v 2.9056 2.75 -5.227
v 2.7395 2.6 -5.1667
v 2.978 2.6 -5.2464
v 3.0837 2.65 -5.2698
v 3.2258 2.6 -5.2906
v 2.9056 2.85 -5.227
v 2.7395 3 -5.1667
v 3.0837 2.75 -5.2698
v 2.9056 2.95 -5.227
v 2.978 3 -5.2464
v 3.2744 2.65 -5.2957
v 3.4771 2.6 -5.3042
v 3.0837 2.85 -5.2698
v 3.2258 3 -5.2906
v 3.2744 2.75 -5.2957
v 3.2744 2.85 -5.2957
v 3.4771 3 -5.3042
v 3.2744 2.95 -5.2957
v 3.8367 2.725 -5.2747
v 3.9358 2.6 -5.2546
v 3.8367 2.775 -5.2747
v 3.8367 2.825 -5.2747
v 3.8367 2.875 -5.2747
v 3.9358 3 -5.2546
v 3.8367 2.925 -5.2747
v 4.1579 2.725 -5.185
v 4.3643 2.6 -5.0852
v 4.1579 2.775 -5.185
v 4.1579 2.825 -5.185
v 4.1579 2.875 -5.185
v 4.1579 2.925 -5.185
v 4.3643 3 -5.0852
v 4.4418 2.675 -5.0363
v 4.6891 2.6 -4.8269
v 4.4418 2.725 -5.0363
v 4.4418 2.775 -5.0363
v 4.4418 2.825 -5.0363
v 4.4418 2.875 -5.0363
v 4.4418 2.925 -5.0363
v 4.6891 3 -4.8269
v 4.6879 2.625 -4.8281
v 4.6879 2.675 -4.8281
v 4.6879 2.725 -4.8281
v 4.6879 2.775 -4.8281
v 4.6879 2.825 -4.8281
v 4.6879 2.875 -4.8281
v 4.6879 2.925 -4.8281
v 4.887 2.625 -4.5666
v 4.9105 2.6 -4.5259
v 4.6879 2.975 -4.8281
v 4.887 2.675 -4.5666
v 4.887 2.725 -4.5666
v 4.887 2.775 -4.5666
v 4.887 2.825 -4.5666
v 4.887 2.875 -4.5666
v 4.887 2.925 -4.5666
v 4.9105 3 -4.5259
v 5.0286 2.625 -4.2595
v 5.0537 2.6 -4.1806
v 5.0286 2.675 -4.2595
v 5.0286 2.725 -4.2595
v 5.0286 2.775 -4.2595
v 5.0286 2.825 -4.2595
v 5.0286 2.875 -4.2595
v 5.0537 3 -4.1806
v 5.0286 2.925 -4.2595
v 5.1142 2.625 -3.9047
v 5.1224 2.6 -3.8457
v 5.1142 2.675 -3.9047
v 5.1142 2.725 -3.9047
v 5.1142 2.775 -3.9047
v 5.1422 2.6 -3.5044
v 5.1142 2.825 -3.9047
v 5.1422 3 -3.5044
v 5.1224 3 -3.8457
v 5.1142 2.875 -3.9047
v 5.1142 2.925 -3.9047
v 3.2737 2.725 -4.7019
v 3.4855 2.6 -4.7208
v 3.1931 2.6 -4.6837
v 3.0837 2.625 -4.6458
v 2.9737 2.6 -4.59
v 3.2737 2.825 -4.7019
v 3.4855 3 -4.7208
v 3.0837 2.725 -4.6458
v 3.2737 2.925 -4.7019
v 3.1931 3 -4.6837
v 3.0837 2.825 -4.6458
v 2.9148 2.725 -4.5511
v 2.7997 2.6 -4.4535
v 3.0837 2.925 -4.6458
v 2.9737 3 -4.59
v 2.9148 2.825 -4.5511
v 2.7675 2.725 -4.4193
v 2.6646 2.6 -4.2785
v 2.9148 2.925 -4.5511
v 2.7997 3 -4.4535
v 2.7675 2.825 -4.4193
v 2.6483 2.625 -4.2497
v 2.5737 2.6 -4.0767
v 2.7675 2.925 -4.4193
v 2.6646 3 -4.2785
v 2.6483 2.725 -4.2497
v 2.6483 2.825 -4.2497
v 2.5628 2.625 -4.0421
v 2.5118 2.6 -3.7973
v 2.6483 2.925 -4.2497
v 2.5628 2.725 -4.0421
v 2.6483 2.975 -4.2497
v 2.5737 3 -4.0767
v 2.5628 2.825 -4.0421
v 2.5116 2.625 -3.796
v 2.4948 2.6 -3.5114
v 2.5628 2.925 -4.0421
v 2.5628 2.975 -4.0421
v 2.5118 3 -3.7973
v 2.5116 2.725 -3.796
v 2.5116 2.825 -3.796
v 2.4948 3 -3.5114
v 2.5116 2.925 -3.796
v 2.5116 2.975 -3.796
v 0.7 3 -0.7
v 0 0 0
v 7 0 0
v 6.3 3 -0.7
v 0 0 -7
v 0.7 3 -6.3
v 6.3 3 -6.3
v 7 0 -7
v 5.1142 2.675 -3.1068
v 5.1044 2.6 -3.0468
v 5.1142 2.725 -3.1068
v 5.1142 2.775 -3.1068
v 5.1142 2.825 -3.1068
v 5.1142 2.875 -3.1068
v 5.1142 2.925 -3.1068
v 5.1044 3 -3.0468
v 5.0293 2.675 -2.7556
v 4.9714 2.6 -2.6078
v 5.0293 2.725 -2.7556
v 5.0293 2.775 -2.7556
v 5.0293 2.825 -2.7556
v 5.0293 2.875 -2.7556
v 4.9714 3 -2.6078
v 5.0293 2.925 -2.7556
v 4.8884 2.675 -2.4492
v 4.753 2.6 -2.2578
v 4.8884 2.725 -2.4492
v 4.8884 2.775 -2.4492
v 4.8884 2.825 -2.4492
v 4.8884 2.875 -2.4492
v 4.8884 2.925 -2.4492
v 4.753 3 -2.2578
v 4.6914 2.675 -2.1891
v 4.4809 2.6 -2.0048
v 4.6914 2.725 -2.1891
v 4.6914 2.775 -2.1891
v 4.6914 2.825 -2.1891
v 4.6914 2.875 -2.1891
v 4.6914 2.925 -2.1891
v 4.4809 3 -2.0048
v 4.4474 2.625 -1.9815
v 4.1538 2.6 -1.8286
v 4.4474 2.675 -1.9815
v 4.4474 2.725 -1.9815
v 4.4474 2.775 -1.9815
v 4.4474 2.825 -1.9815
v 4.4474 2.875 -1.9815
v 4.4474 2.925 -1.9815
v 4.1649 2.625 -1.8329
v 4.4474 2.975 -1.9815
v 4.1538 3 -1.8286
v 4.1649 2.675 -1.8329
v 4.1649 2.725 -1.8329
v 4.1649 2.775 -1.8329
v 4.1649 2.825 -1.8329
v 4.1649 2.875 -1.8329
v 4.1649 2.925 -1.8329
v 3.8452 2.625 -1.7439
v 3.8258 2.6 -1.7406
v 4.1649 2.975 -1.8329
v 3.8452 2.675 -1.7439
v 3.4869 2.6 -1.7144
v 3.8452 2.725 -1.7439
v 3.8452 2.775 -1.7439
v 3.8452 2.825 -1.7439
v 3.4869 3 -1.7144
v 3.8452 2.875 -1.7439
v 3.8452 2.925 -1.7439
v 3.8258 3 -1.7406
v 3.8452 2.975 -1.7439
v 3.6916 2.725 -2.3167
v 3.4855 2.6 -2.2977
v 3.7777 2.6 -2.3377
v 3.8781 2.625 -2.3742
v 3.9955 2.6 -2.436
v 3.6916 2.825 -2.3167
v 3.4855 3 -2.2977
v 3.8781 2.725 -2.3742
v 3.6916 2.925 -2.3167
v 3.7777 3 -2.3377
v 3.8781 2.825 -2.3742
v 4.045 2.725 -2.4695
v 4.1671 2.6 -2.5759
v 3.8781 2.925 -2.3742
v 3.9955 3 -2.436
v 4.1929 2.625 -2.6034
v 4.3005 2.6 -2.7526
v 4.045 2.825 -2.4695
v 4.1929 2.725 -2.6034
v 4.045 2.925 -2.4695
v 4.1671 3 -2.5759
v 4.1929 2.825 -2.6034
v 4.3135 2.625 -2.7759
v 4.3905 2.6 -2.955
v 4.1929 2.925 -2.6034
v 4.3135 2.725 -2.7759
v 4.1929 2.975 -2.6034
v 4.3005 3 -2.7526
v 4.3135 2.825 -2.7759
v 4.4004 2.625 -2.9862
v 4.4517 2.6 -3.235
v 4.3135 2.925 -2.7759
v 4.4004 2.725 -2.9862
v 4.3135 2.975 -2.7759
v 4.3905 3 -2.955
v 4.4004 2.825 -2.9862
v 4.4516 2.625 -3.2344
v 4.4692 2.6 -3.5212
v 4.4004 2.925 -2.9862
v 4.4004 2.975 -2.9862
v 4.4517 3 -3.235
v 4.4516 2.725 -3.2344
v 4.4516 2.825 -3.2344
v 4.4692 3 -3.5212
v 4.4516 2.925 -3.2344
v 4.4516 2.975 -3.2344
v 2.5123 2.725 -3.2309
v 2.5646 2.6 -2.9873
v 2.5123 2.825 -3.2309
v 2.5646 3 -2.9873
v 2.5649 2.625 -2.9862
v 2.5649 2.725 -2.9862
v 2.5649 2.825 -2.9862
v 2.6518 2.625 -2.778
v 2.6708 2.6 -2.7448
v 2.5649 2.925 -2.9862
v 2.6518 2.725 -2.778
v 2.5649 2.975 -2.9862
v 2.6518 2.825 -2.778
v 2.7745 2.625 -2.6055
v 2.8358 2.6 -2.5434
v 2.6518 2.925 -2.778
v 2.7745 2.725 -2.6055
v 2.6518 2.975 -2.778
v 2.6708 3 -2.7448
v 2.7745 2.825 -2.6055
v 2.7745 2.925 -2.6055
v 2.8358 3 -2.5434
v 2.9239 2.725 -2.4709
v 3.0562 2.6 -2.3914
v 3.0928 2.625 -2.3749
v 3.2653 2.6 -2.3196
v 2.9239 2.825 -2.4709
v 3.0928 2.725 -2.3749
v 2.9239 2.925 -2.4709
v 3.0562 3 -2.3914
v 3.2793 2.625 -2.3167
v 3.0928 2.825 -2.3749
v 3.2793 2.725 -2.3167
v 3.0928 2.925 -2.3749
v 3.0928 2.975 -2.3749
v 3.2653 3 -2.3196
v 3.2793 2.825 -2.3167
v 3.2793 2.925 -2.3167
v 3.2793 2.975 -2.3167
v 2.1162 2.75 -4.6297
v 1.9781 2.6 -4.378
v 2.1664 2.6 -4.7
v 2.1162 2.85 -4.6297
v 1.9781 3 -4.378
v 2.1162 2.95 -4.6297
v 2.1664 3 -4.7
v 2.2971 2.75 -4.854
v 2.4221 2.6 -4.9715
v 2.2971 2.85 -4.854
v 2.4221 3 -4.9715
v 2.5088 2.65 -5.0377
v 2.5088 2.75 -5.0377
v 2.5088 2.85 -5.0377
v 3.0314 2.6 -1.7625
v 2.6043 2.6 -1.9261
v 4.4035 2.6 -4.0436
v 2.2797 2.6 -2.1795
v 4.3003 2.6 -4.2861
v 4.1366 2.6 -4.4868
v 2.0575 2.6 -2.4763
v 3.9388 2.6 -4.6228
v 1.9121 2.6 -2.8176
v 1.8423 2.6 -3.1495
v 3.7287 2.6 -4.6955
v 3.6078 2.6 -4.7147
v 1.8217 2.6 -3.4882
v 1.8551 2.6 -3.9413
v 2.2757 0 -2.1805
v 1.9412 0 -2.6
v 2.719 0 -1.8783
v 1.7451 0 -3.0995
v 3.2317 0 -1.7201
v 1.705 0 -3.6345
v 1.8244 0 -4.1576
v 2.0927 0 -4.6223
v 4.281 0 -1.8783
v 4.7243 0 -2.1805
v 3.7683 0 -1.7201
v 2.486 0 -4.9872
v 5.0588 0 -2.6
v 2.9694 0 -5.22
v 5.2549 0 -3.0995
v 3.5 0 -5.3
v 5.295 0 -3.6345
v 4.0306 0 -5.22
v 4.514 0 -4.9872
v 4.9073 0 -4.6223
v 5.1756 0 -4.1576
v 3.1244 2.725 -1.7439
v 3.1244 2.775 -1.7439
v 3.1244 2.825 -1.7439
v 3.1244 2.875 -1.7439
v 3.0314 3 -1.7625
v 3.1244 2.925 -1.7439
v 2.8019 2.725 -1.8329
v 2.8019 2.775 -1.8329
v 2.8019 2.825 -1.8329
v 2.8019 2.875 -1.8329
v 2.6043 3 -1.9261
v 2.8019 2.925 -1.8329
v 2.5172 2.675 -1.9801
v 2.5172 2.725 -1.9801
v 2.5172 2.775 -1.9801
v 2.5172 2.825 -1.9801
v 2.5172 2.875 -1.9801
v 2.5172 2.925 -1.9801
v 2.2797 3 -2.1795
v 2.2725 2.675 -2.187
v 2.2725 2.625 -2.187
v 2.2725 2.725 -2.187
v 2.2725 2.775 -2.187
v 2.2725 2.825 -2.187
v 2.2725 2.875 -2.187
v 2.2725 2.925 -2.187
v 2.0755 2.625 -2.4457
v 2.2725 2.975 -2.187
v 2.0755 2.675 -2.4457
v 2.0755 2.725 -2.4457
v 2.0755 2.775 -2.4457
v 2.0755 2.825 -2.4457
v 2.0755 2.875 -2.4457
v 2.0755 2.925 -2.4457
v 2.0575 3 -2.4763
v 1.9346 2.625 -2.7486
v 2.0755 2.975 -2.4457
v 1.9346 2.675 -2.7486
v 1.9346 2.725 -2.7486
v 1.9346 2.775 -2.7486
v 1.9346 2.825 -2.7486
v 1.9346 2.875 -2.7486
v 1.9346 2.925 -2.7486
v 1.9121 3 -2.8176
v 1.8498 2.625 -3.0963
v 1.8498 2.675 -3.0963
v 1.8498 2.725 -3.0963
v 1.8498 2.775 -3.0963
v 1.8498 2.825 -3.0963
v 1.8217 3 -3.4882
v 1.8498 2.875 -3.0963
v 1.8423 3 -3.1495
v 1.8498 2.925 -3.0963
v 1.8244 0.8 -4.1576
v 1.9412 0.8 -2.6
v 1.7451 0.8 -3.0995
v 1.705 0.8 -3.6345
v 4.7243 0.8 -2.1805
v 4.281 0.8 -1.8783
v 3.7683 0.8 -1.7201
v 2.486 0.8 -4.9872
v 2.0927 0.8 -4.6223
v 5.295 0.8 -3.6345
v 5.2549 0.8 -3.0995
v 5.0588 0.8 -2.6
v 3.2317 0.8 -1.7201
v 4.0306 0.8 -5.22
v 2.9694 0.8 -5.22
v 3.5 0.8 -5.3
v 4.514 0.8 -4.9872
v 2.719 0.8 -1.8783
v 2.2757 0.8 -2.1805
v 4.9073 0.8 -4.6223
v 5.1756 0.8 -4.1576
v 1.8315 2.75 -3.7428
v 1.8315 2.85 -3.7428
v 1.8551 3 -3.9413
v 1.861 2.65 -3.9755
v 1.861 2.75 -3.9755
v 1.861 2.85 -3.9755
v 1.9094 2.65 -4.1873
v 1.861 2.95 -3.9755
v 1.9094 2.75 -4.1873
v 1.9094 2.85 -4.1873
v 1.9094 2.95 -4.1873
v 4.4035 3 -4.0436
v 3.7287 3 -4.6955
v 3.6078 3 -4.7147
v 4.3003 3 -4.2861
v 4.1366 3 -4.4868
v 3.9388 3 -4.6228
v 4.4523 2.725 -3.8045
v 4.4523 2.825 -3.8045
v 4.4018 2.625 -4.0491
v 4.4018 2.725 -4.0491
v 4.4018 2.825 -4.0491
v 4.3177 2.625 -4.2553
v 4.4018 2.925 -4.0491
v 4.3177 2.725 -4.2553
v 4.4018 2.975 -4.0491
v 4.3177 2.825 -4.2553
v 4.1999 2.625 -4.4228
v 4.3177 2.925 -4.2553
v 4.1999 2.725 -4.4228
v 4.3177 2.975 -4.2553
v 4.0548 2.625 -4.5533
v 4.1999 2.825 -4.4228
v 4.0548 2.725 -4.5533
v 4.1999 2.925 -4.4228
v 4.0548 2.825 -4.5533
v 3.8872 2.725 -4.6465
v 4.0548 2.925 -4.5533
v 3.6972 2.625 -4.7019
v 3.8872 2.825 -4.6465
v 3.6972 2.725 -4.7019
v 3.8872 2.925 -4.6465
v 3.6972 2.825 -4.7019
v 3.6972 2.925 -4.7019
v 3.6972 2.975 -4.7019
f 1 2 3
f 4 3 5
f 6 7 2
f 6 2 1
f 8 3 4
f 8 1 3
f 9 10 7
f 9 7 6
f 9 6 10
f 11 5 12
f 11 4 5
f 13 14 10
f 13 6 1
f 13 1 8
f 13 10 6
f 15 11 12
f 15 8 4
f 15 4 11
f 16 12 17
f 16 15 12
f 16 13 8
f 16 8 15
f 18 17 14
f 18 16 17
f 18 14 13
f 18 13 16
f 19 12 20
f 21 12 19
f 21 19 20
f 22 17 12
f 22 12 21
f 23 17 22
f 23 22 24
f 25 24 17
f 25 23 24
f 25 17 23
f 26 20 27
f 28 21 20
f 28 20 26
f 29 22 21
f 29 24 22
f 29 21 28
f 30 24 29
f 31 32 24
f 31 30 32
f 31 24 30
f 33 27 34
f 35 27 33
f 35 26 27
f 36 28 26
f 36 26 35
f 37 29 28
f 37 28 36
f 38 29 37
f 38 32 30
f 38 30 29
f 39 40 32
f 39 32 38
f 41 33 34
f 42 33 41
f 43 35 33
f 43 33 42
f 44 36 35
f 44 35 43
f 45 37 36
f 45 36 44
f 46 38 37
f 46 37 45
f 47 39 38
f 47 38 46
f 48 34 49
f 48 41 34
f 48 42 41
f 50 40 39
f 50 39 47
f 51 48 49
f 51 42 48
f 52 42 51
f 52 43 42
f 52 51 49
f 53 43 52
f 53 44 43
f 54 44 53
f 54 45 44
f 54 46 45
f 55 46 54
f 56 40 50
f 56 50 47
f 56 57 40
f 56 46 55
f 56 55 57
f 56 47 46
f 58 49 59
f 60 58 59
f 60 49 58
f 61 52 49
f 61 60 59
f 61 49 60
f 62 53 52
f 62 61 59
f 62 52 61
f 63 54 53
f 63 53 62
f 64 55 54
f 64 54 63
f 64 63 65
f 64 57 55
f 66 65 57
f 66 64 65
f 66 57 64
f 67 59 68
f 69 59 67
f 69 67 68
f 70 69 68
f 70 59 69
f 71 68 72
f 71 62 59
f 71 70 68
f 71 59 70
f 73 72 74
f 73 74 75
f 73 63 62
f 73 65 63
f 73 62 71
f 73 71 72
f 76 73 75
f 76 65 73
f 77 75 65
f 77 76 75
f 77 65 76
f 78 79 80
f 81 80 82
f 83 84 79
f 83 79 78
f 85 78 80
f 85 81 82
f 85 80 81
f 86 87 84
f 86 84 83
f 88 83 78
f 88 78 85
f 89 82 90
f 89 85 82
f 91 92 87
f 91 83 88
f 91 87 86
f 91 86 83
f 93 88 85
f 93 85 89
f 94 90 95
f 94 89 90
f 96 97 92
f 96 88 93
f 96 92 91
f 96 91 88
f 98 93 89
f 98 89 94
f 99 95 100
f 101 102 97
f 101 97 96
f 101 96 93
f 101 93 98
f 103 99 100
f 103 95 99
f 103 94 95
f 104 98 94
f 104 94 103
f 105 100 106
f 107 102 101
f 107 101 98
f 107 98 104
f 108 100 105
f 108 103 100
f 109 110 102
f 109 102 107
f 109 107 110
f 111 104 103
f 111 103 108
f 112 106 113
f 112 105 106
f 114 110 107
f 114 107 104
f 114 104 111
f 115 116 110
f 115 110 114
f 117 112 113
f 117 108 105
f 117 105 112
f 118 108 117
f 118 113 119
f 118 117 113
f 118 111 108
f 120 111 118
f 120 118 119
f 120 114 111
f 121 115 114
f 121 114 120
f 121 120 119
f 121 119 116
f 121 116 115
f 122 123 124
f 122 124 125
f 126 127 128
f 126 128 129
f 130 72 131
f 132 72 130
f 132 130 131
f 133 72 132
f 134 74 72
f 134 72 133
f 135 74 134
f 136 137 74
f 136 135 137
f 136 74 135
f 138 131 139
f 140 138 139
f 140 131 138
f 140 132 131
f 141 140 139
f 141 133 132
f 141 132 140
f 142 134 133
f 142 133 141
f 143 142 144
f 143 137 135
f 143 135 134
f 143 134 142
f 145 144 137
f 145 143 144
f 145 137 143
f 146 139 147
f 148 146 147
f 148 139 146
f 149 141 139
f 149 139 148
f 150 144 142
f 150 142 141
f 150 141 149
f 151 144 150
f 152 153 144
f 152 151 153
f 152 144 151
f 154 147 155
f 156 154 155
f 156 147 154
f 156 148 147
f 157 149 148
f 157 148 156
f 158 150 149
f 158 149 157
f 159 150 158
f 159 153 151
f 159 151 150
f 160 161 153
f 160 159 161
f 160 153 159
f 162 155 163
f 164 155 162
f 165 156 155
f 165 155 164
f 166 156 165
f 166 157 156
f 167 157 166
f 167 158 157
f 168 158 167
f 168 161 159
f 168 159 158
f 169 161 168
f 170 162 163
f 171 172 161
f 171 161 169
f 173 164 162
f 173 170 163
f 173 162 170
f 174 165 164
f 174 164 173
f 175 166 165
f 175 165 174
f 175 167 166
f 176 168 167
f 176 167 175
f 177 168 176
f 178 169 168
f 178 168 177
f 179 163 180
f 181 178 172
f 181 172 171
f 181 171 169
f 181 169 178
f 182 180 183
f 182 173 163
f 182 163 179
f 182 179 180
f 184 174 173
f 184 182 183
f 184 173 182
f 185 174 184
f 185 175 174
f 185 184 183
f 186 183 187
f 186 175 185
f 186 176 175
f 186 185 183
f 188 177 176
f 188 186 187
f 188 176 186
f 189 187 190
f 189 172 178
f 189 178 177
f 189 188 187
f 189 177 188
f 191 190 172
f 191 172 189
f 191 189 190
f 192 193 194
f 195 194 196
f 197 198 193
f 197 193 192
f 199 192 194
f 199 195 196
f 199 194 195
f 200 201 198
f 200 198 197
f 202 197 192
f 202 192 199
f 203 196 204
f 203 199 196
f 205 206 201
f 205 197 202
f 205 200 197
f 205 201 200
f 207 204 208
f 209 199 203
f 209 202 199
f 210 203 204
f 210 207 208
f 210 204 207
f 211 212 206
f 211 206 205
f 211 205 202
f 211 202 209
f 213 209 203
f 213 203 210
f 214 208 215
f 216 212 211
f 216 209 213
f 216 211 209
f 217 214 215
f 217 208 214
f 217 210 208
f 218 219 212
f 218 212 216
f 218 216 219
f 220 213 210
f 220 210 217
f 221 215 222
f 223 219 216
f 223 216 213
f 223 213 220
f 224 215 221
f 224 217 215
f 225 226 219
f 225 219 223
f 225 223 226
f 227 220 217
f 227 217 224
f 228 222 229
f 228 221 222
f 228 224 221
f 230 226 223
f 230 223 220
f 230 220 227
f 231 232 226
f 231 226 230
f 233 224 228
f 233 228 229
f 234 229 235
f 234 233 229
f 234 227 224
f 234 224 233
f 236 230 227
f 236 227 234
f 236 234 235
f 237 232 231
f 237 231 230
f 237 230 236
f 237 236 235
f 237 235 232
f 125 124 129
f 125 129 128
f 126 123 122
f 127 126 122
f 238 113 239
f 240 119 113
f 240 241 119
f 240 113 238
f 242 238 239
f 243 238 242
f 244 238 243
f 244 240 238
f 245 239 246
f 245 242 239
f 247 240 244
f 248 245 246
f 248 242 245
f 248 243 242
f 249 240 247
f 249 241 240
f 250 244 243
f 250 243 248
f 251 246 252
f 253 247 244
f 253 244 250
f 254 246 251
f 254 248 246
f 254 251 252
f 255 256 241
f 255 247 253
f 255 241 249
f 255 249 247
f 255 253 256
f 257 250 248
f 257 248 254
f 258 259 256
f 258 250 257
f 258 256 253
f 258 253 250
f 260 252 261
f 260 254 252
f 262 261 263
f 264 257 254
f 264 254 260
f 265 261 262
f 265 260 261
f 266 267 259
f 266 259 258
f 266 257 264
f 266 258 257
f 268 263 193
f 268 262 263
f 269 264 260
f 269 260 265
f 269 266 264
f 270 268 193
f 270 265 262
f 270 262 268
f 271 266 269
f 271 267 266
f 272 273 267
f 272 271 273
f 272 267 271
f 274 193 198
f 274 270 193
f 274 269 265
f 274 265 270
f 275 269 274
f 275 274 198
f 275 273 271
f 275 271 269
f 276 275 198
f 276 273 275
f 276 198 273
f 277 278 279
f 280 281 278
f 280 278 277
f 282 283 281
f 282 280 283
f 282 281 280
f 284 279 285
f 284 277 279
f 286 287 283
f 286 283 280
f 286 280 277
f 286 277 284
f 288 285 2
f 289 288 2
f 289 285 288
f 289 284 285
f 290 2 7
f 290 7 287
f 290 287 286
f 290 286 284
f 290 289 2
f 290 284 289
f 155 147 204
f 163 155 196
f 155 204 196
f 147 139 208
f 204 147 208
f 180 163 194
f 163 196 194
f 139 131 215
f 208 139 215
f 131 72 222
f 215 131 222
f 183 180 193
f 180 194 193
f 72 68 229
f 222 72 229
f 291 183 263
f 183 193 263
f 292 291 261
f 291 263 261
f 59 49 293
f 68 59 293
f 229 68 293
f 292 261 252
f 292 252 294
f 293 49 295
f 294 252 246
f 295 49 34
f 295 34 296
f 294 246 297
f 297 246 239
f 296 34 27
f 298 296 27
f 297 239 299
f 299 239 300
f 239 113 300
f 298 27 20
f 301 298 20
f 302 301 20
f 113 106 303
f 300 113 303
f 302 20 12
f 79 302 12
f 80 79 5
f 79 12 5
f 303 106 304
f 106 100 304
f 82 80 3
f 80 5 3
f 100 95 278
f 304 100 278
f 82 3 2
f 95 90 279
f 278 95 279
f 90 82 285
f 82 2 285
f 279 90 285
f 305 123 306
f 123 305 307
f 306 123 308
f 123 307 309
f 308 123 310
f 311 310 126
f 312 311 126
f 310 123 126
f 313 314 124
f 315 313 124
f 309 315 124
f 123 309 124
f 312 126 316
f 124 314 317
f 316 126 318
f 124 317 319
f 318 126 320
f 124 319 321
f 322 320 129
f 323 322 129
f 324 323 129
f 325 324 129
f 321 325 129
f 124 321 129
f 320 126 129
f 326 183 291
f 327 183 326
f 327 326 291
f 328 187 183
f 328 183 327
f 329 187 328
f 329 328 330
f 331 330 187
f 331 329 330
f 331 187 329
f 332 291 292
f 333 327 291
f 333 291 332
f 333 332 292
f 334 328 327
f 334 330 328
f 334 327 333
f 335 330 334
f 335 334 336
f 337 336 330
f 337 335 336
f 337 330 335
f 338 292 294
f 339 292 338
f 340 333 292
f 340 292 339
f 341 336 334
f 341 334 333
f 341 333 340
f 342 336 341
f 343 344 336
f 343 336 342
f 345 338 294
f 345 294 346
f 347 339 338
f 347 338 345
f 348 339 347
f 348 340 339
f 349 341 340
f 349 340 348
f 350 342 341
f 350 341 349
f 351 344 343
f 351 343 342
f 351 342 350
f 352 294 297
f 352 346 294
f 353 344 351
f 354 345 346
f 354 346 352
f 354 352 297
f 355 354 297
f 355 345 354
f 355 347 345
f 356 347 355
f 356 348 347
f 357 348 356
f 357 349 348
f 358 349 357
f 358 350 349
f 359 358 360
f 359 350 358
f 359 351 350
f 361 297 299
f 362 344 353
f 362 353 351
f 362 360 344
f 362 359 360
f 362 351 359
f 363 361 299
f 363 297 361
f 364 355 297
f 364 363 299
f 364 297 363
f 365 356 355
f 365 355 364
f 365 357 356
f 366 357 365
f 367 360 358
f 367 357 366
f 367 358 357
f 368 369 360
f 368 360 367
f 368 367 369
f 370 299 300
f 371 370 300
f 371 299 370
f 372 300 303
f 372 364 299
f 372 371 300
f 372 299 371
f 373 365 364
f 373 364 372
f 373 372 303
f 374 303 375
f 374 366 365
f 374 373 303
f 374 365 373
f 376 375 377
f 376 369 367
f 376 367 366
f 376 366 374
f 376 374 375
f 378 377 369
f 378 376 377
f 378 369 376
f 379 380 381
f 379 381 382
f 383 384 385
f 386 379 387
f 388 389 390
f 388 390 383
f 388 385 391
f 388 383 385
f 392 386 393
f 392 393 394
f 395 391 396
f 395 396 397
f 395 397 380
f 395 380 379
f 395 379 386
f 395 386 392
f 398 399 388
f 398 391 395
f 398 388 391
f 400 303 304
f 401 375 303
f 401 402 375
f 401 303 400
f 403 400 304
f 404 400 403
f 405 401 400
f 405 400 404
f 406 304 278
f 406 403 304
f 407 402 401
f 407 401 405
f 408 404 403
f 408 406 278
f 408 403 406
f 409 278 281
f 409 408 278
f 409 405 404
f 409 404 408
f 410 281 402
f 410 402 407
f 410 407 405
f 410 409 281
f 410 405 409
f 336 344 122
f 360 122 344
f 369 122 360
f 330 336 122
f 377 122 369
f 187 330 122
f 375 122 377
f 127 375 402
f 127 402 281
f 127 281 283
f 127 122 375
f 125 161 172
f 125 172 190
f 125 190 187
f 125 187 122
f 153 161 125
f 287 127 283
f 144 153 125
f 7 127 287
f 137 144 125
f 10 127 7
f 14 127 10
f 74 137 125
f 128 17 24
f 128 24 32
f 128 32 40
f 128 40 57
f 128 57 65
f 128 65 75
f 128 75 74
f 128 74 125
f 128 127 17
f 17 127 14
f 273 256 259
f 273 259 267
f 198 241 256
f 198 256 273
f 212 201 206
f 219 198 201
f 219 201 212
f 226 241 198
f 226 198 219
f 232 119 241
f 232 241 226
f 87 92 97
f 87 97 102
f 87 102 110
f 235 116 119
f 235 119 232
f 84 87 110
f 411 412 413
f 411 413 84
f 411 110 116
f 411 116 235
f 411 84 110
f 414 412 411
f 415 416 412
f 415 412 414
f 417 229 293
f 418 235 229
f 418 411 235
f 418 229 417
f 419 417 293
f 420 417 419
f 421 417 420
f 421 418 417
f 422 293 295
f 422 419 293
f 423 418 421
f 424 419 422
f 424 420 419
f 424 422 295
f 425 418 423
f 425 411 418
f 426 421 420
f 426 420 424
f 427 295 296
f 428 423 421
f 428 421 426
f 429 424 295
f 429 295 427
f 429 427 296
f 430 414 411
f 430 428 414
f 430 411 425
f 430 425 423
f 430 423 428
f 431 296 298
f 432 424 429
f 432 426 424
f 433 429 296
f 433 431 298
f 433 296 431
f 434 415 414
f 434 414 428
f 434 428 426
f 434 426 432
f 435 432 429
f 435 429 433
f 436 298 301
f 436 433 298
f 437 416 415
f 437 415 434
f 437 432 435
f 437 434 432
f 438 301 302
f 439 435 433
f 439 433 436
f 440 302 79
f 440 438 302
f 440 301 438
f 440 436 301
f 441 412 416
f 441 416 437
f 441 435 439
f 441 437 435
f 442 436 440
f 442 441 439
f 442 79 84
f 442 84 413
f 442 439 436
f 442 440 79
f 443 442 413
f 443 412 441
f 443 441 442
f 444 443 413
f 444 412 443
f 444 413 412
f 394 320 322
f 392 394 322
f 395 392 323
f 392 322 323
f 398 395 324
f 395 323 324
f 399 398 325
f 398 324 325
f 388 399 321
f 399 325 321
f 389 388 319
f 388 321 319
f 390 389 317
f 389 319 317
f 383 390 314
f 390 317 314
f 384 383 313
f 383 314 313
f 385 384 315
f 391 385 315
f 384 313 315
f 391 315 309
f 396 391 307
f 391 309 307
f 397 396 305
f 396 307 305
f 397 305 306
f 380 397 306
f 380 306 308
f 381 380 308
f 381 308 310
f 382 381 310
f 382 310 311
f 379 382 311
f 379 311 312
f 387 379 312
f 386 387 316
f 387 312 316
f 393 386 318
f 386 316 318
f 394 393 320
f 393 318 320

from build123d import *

# Parameters (mm, degrees)
SKETCH1_W           = 7
SKETCH1_H           = 7
BOSS_EXTRUDE1_DEPTH = 3
CUT_EXTRUDE1_DEPTH  = 7
CUT_EXTRUDE2_DEPTH  = 11
SKETCH4_R           = 1.8
CUT_EXTRUDE3_DEPTH  = 0.8
CUT_EXTRUDE4_DEPTH  = 0.4


with BuildPart() as part:
    # Sketch1 → Boss-Extrude1 (new body)
    with BuildSketch(Plane(origin=(0, 0, 0), x_dir=(1, 0, 0), z_dir=(0, 1, 0))):
        with Locations((3.5, 3.5)):
            Rectangle(SKETCH1_W, SKETCH1_H)
    extrude(amount=BOSS_EXTRUDE1_DEPTH)

    # Sketch2 → Cut-Extrude1 (cut)
    with BuildSketch(Plane.XY):
        Polygon((0, 0), (0.7, 3), (0, 3), align=None)
        Polygon((7, 0), (6.3, 3), (7, 3), align=None)
    extrude(amount=-CUT_EXTRUDE1_DEPTH, mode=Mode.SUBTRACT)

    # Sketch3 → Cut-Extrude2 (cut)
    with BuildSketch(Plane(origin=(0, 0, 0), x_dir=(0, 0, -1), z_dir=(1, 0, 0))):
        Polygon((0, 0), (0.7, 3), (0, 3), align=None)
        Polygon((7, 3), (6.3, 3), (7, 0), align=None)
    extrude(amount=CUT_EXTRUDE2_DEPTH, mode=Mode.SUBTRACT)

    # Sketch4 → Cut-Extrude3 (cut)
    with BuildSketch(Plane.XZ):
        with Locations(Location((3.5, -3.5, 0), (0, 0, 270))):
            Circle(SKETCH4_R)
    extrude(amount=-CUT_EXTRUDE3_DEPTH, mode=Mode.SUBTRACT)

    # Sketch5 → Cut-Extrude4 (cut)
    with BuildSketch(Plane(origin=(0, 3, 0), x_dir=(1, 0, 0), z_dir=(0, 1, 0))):
        with BuildLine():
            add(Edge.make_bspline(
                [(1.821714103, 3.488248698), (1.821961784, 3.531500253), (1.822448196, 3.616440725), (1.830876604, 3.741051587), (1.841985901, 3.86049575), (1.860077374, 3.974303397), (1.881359551, 4.083007187), (1.907977906, 4.186574853), (1.940043598, 4.284643186), (1.96555211, 4.347258757), (1.978064263, 4.377972255)],
                knots=[0, 0, 0, 0, 1.141009212, 2.240794809, 3.294380675, 4.305229195, 5.280013876, 6.216333343, 7.125095522, 8, 8, 8, 8], degree=3))
            add(Edge.make_bspline(
                [(1.978064263, 4.377972255), (1.998516886, 4.421635051), (2.039181575, 4.508447097), (2.114702293, 4.631119496), (2.200300575, 4.746809508), (2.295271713, 4.854910638), (2.397191064, 4.953795484), (2.506539435, 5.038426674), (2.619432008, 5.111662383), (2.699724257, 5.148495592), (2.739482532, 5.166734275)],
                knots=[0, 0, 0, 0, 1.031372299, 2.050613973, 3.077158538, 4.108712802, 5.127684358, 6.111366908, 7.06480644, 8, 8, 8, 8], degree=3))
            add(Edge.make_bspline(
                [(2.739482532, 5.166734275), (2.766470301, 5.177804055), (2.821019461, 5.200178904), (2.905795278, 5.228103887), (2.993787729, 5.250791674), (3.084360371, 5.271071912), (3.178392588, 5.285055803), (3.27512456, 5.296780816), (3.375085669, 5.302926099), (3.442700631, 5.303740345), (3.47706266, 5.304154146)],
                knots=[0, 0, 0, 0, 0.92659354, 1.872881803, 2.832850937, 3.813025581, 4.820167273, 5.851730198, 6.908245912, 8, 8, 8, 8], degree=3))
            add(Edge.make_bspline(
                [(3.47706266, 5.304154146), (3.538590536, 5.302611845), (3.659001433, 5.299593539), (3.834887941, 5.277792675), (4.001329981, 5.240979909), (4.157764144, 5.187771817), (4.305539157, 5.121260548), (4.443506895, 5.038760892), (4.571871554, 4.941165749), (4.690385205, 4.829813461), (4.797115236, 4.704898086), (4.890068226, 4.567586522), (4.968043218, 4.418522223), (5.032260126, 4.258116463), (5.081605981, 4.085845307), (5.117258315, 3.902194835), (5.138438688, 3.707029775), (5.140941529, 3.573137898), (5.142226923, 3.504374499)],
                knots=[0, 0, 0, 0, 1.064641025, 2.083517118, 3.061799897, 4.009540929, 4.938075217, 5.861300345, 6.78508344, 7.723570974, 8.670267188, 9.622657076, 10.586935816, 11.576069104, 12.607749008, 13.683335114, 14.81022093, 16, 16, 16, 16], degree=3))
            add(Edge.make_bspline(
                [(5.142226923, 3.504374499), (5.140971218, 3.436071549), (5.138526593, 3.303098467), (5.116950876, 3.109464875), (5.082776635, 2.92715322), (5.032236807, 2.75657997), (4.969936504, 2.596443536), (4.89115913, 2.448651271), (4.800152856, 2.311242808), (4.693574415, 2.187673494), (4.577055417, 2.075682155), (4.448853581, 1.979227653), (4.31189018, 1.896616215), (4.164920865, 1.829912739), (4.008903554, 1.777800449), (3.843329096, 1.740704804), (3.668112571, 1.718987832), (3.548170832, 1.715958568), (3.486878366, 1.714410557)],
                knots=[0, 0, 0, 0, 1.18845052, 2.313691126, 3.386664782, 4.412527756, 5.405809582, 6.372003093, 7.321919452, 8.268293321, 9.206237639, 10.129603466, 11.054616372, 11.9847576, 12.932764752, 13.912672021, 14.933336461, 16, 16, 16, 16], degree=3))
            add(Edge.make_bspline(
                [(3.486878366, 1.714410557), (3.424885779, 1.71596214), (3.303548476, 1.718999034), (3.126463104, 1.7406499), (2.959245037, 1.777757756), (2.802013351, 1.830053351), (2.653695695, 1.895743521), (2.51566143, 1.97751079), (2.387834254, 2.074576155), (2.270341671, 2.185249258), (2.163829132, 2.308455276), (2.072952075, 2.444980241), (1.994170592, 2.591328945), (1.931542745, 2.74971822), (1.881281222, 2.918518444), (1.847023473, 3.098700906), (1.825406036, 3.289769697), (1.822967241, 3.420879762), (1.821714103, 3.488248698)],
                knots=[0, 0, 0, 0, 1.080878253, 2.11558926, 3.1052859, 4.062802436, 5.000434901, 5.928596448, 6.853693179, 7.793554778, 8.738606028, 9.68692032, 10.647726704, 11.63151566, 12.651483354, 13.714466703, 14.825613081, 16, 16, 16, 16], degree=3))
        make_face()
        with BuildLine():
            add(Edge.make_bspline(
                [(2.494791026, 3.511385717), (2.495463421, 3.46297147), (2.496765502, 3.369218203), (2.510634389, 3.233137604), (2.531681539, 3.105921329), (2.562634465, 2.987713764), (2.601737596, 2.878429396), (2.649647038, 2.77797681), (2.7061648, 2.686206391), (2.772752717, 2.605055542), (2.844795621, 2.532603477), (2.92255951, 2.469914167), (3.004595136, 2.415957097), (3.092321967, 2.373358172), (3.183914249, 2.339551264), (3.280083591, 2.31448468), (3.381308169, 2.300720664), (3.450381011, 2.298746792), (3.485476122, 2.29774389)],
                knots=[0, 0, 0, 0, 1.313550922, 2.543666373, 3.708465049, 4.810029406, 5.85539231, 6.85404609, 7.825601258, 8.772642133, 9.696587791, 10.59409323, 11.479048685, 12.35559886, 13.234601248, 14.125357077, 15.047515647, 16, 16, 16, 16], degree=3))
            add(Edge.make_bspline(
                [(3.485476122, 2.29774389), (3.520575961, 2.298726471), (3.589658109, 2.30066035), (3.690758312, 2.31470579), (3.787118236, 2.338697967), (3.878346649, 2.372331634), (3.964859358, 2.415606978), (4.046581009, 2.468354444), (4.123040539, 2.531328963), (4.195005026, 2.602728481), (4.259795575, 2.684418325), (4.315832134, 2.776172907), (4.363717971, 2.877234741), (4.40282522, 2.987641635), (4.433016388, 3.107601318), (4.453204553, 3.23717726), (4.467185589, 3.375998963), (4.46848236, 3.471851744), (4.46915, 3.521201422)],
                knots=[0, 0, 0, 0, 0.949153107, 1.868086493, 2.754172764, 3.630100905, 4.492260106, 5.365378617, 6.254840125, 7.166615376, 8.102436631, 9.067266169, 10.06813181, 11.121736829, 12.23011542, 13.408501285, 14.665770308, 16, 16, 16, 16], degree=3))
            add(Edge.make_bspline(
                [(4.46915, 3.521201422), (4.468395892, 3.570074602), (4.466935489, 3.66472216), (4.45421689, 3.801791371), (4.433386174, 3.929313247), (4.404429177, 4.047254755), (4.366160687, 4.155634899), (4.320453453, 4.254750055), (4.265186916, 4.344082401), (4.20180297, 4.423585682), (4.131665715, 4.493563899), (4.055966759, 4.554826829), (3.974276008, 4.605801311), (3.88739075, 4.648689422), (3.794406419, 4.680507955), (3.696267954, 4.703716125), (3.592697629, 4.718007752), (3.521746781, 4.719869217), (3.485476122, 4.720820813)],
                knots=[0, 0, 0, 0, 1.332337092, 2.580197383, 3.749299508, 4.852775005, 5.886662144, 6.878700295, 7.822989687, 8.743523536, 9.644687758, 10.519443927, 11.392806431, 12.264866173, 13.155606721, 14.065961015, 15.011303331, 16, 16, 16, 16], degree=3))
            add(Edge.make_bspline(
                [(3.485476122, 4.720820813), (3.449200879, 4.719883854), (3.378241063, 4.718051022), (3.274509295, 4.703522778), (3.176061662, 4.681006152), (3.083090474, 4.647370777), (2.995448418, 4.604894527), (2.913459658, 4.552215512), (2.836478148, 4.49105655), (2.765712484, 4.420017304), (2.701301518, 4.339817822), (2.646008366, 4.249393926), (2.598858806, 4.149733156), (2.560175326, 4.040540508), (2.531498905, 3.9215156), (2.509458688, 3.79345835), (2.49708172, 3.655593683), (2.495571002, 3.560488178), (2.494791026, 3.511385717)],
                knots=[0, 0, 0, 0, 0.981996942, 1.920933313, 2.83127778, 3.712125466, 4.592427284, 5.463259035, 6.34592384, 7.249932058, 8.173122297, 9.125107726, 10.113123258, 11.154048744, 12.256187849, 13.424658091, 14.670364834, 16, 16, 16, 16], degree=3))
        make_face(mode=Mode.SUBTRACT)
    extrude(amount=-CUT_EXTRUDE4_DEPTH, mode=Mode.SUBTRACT)


solid = part.part
